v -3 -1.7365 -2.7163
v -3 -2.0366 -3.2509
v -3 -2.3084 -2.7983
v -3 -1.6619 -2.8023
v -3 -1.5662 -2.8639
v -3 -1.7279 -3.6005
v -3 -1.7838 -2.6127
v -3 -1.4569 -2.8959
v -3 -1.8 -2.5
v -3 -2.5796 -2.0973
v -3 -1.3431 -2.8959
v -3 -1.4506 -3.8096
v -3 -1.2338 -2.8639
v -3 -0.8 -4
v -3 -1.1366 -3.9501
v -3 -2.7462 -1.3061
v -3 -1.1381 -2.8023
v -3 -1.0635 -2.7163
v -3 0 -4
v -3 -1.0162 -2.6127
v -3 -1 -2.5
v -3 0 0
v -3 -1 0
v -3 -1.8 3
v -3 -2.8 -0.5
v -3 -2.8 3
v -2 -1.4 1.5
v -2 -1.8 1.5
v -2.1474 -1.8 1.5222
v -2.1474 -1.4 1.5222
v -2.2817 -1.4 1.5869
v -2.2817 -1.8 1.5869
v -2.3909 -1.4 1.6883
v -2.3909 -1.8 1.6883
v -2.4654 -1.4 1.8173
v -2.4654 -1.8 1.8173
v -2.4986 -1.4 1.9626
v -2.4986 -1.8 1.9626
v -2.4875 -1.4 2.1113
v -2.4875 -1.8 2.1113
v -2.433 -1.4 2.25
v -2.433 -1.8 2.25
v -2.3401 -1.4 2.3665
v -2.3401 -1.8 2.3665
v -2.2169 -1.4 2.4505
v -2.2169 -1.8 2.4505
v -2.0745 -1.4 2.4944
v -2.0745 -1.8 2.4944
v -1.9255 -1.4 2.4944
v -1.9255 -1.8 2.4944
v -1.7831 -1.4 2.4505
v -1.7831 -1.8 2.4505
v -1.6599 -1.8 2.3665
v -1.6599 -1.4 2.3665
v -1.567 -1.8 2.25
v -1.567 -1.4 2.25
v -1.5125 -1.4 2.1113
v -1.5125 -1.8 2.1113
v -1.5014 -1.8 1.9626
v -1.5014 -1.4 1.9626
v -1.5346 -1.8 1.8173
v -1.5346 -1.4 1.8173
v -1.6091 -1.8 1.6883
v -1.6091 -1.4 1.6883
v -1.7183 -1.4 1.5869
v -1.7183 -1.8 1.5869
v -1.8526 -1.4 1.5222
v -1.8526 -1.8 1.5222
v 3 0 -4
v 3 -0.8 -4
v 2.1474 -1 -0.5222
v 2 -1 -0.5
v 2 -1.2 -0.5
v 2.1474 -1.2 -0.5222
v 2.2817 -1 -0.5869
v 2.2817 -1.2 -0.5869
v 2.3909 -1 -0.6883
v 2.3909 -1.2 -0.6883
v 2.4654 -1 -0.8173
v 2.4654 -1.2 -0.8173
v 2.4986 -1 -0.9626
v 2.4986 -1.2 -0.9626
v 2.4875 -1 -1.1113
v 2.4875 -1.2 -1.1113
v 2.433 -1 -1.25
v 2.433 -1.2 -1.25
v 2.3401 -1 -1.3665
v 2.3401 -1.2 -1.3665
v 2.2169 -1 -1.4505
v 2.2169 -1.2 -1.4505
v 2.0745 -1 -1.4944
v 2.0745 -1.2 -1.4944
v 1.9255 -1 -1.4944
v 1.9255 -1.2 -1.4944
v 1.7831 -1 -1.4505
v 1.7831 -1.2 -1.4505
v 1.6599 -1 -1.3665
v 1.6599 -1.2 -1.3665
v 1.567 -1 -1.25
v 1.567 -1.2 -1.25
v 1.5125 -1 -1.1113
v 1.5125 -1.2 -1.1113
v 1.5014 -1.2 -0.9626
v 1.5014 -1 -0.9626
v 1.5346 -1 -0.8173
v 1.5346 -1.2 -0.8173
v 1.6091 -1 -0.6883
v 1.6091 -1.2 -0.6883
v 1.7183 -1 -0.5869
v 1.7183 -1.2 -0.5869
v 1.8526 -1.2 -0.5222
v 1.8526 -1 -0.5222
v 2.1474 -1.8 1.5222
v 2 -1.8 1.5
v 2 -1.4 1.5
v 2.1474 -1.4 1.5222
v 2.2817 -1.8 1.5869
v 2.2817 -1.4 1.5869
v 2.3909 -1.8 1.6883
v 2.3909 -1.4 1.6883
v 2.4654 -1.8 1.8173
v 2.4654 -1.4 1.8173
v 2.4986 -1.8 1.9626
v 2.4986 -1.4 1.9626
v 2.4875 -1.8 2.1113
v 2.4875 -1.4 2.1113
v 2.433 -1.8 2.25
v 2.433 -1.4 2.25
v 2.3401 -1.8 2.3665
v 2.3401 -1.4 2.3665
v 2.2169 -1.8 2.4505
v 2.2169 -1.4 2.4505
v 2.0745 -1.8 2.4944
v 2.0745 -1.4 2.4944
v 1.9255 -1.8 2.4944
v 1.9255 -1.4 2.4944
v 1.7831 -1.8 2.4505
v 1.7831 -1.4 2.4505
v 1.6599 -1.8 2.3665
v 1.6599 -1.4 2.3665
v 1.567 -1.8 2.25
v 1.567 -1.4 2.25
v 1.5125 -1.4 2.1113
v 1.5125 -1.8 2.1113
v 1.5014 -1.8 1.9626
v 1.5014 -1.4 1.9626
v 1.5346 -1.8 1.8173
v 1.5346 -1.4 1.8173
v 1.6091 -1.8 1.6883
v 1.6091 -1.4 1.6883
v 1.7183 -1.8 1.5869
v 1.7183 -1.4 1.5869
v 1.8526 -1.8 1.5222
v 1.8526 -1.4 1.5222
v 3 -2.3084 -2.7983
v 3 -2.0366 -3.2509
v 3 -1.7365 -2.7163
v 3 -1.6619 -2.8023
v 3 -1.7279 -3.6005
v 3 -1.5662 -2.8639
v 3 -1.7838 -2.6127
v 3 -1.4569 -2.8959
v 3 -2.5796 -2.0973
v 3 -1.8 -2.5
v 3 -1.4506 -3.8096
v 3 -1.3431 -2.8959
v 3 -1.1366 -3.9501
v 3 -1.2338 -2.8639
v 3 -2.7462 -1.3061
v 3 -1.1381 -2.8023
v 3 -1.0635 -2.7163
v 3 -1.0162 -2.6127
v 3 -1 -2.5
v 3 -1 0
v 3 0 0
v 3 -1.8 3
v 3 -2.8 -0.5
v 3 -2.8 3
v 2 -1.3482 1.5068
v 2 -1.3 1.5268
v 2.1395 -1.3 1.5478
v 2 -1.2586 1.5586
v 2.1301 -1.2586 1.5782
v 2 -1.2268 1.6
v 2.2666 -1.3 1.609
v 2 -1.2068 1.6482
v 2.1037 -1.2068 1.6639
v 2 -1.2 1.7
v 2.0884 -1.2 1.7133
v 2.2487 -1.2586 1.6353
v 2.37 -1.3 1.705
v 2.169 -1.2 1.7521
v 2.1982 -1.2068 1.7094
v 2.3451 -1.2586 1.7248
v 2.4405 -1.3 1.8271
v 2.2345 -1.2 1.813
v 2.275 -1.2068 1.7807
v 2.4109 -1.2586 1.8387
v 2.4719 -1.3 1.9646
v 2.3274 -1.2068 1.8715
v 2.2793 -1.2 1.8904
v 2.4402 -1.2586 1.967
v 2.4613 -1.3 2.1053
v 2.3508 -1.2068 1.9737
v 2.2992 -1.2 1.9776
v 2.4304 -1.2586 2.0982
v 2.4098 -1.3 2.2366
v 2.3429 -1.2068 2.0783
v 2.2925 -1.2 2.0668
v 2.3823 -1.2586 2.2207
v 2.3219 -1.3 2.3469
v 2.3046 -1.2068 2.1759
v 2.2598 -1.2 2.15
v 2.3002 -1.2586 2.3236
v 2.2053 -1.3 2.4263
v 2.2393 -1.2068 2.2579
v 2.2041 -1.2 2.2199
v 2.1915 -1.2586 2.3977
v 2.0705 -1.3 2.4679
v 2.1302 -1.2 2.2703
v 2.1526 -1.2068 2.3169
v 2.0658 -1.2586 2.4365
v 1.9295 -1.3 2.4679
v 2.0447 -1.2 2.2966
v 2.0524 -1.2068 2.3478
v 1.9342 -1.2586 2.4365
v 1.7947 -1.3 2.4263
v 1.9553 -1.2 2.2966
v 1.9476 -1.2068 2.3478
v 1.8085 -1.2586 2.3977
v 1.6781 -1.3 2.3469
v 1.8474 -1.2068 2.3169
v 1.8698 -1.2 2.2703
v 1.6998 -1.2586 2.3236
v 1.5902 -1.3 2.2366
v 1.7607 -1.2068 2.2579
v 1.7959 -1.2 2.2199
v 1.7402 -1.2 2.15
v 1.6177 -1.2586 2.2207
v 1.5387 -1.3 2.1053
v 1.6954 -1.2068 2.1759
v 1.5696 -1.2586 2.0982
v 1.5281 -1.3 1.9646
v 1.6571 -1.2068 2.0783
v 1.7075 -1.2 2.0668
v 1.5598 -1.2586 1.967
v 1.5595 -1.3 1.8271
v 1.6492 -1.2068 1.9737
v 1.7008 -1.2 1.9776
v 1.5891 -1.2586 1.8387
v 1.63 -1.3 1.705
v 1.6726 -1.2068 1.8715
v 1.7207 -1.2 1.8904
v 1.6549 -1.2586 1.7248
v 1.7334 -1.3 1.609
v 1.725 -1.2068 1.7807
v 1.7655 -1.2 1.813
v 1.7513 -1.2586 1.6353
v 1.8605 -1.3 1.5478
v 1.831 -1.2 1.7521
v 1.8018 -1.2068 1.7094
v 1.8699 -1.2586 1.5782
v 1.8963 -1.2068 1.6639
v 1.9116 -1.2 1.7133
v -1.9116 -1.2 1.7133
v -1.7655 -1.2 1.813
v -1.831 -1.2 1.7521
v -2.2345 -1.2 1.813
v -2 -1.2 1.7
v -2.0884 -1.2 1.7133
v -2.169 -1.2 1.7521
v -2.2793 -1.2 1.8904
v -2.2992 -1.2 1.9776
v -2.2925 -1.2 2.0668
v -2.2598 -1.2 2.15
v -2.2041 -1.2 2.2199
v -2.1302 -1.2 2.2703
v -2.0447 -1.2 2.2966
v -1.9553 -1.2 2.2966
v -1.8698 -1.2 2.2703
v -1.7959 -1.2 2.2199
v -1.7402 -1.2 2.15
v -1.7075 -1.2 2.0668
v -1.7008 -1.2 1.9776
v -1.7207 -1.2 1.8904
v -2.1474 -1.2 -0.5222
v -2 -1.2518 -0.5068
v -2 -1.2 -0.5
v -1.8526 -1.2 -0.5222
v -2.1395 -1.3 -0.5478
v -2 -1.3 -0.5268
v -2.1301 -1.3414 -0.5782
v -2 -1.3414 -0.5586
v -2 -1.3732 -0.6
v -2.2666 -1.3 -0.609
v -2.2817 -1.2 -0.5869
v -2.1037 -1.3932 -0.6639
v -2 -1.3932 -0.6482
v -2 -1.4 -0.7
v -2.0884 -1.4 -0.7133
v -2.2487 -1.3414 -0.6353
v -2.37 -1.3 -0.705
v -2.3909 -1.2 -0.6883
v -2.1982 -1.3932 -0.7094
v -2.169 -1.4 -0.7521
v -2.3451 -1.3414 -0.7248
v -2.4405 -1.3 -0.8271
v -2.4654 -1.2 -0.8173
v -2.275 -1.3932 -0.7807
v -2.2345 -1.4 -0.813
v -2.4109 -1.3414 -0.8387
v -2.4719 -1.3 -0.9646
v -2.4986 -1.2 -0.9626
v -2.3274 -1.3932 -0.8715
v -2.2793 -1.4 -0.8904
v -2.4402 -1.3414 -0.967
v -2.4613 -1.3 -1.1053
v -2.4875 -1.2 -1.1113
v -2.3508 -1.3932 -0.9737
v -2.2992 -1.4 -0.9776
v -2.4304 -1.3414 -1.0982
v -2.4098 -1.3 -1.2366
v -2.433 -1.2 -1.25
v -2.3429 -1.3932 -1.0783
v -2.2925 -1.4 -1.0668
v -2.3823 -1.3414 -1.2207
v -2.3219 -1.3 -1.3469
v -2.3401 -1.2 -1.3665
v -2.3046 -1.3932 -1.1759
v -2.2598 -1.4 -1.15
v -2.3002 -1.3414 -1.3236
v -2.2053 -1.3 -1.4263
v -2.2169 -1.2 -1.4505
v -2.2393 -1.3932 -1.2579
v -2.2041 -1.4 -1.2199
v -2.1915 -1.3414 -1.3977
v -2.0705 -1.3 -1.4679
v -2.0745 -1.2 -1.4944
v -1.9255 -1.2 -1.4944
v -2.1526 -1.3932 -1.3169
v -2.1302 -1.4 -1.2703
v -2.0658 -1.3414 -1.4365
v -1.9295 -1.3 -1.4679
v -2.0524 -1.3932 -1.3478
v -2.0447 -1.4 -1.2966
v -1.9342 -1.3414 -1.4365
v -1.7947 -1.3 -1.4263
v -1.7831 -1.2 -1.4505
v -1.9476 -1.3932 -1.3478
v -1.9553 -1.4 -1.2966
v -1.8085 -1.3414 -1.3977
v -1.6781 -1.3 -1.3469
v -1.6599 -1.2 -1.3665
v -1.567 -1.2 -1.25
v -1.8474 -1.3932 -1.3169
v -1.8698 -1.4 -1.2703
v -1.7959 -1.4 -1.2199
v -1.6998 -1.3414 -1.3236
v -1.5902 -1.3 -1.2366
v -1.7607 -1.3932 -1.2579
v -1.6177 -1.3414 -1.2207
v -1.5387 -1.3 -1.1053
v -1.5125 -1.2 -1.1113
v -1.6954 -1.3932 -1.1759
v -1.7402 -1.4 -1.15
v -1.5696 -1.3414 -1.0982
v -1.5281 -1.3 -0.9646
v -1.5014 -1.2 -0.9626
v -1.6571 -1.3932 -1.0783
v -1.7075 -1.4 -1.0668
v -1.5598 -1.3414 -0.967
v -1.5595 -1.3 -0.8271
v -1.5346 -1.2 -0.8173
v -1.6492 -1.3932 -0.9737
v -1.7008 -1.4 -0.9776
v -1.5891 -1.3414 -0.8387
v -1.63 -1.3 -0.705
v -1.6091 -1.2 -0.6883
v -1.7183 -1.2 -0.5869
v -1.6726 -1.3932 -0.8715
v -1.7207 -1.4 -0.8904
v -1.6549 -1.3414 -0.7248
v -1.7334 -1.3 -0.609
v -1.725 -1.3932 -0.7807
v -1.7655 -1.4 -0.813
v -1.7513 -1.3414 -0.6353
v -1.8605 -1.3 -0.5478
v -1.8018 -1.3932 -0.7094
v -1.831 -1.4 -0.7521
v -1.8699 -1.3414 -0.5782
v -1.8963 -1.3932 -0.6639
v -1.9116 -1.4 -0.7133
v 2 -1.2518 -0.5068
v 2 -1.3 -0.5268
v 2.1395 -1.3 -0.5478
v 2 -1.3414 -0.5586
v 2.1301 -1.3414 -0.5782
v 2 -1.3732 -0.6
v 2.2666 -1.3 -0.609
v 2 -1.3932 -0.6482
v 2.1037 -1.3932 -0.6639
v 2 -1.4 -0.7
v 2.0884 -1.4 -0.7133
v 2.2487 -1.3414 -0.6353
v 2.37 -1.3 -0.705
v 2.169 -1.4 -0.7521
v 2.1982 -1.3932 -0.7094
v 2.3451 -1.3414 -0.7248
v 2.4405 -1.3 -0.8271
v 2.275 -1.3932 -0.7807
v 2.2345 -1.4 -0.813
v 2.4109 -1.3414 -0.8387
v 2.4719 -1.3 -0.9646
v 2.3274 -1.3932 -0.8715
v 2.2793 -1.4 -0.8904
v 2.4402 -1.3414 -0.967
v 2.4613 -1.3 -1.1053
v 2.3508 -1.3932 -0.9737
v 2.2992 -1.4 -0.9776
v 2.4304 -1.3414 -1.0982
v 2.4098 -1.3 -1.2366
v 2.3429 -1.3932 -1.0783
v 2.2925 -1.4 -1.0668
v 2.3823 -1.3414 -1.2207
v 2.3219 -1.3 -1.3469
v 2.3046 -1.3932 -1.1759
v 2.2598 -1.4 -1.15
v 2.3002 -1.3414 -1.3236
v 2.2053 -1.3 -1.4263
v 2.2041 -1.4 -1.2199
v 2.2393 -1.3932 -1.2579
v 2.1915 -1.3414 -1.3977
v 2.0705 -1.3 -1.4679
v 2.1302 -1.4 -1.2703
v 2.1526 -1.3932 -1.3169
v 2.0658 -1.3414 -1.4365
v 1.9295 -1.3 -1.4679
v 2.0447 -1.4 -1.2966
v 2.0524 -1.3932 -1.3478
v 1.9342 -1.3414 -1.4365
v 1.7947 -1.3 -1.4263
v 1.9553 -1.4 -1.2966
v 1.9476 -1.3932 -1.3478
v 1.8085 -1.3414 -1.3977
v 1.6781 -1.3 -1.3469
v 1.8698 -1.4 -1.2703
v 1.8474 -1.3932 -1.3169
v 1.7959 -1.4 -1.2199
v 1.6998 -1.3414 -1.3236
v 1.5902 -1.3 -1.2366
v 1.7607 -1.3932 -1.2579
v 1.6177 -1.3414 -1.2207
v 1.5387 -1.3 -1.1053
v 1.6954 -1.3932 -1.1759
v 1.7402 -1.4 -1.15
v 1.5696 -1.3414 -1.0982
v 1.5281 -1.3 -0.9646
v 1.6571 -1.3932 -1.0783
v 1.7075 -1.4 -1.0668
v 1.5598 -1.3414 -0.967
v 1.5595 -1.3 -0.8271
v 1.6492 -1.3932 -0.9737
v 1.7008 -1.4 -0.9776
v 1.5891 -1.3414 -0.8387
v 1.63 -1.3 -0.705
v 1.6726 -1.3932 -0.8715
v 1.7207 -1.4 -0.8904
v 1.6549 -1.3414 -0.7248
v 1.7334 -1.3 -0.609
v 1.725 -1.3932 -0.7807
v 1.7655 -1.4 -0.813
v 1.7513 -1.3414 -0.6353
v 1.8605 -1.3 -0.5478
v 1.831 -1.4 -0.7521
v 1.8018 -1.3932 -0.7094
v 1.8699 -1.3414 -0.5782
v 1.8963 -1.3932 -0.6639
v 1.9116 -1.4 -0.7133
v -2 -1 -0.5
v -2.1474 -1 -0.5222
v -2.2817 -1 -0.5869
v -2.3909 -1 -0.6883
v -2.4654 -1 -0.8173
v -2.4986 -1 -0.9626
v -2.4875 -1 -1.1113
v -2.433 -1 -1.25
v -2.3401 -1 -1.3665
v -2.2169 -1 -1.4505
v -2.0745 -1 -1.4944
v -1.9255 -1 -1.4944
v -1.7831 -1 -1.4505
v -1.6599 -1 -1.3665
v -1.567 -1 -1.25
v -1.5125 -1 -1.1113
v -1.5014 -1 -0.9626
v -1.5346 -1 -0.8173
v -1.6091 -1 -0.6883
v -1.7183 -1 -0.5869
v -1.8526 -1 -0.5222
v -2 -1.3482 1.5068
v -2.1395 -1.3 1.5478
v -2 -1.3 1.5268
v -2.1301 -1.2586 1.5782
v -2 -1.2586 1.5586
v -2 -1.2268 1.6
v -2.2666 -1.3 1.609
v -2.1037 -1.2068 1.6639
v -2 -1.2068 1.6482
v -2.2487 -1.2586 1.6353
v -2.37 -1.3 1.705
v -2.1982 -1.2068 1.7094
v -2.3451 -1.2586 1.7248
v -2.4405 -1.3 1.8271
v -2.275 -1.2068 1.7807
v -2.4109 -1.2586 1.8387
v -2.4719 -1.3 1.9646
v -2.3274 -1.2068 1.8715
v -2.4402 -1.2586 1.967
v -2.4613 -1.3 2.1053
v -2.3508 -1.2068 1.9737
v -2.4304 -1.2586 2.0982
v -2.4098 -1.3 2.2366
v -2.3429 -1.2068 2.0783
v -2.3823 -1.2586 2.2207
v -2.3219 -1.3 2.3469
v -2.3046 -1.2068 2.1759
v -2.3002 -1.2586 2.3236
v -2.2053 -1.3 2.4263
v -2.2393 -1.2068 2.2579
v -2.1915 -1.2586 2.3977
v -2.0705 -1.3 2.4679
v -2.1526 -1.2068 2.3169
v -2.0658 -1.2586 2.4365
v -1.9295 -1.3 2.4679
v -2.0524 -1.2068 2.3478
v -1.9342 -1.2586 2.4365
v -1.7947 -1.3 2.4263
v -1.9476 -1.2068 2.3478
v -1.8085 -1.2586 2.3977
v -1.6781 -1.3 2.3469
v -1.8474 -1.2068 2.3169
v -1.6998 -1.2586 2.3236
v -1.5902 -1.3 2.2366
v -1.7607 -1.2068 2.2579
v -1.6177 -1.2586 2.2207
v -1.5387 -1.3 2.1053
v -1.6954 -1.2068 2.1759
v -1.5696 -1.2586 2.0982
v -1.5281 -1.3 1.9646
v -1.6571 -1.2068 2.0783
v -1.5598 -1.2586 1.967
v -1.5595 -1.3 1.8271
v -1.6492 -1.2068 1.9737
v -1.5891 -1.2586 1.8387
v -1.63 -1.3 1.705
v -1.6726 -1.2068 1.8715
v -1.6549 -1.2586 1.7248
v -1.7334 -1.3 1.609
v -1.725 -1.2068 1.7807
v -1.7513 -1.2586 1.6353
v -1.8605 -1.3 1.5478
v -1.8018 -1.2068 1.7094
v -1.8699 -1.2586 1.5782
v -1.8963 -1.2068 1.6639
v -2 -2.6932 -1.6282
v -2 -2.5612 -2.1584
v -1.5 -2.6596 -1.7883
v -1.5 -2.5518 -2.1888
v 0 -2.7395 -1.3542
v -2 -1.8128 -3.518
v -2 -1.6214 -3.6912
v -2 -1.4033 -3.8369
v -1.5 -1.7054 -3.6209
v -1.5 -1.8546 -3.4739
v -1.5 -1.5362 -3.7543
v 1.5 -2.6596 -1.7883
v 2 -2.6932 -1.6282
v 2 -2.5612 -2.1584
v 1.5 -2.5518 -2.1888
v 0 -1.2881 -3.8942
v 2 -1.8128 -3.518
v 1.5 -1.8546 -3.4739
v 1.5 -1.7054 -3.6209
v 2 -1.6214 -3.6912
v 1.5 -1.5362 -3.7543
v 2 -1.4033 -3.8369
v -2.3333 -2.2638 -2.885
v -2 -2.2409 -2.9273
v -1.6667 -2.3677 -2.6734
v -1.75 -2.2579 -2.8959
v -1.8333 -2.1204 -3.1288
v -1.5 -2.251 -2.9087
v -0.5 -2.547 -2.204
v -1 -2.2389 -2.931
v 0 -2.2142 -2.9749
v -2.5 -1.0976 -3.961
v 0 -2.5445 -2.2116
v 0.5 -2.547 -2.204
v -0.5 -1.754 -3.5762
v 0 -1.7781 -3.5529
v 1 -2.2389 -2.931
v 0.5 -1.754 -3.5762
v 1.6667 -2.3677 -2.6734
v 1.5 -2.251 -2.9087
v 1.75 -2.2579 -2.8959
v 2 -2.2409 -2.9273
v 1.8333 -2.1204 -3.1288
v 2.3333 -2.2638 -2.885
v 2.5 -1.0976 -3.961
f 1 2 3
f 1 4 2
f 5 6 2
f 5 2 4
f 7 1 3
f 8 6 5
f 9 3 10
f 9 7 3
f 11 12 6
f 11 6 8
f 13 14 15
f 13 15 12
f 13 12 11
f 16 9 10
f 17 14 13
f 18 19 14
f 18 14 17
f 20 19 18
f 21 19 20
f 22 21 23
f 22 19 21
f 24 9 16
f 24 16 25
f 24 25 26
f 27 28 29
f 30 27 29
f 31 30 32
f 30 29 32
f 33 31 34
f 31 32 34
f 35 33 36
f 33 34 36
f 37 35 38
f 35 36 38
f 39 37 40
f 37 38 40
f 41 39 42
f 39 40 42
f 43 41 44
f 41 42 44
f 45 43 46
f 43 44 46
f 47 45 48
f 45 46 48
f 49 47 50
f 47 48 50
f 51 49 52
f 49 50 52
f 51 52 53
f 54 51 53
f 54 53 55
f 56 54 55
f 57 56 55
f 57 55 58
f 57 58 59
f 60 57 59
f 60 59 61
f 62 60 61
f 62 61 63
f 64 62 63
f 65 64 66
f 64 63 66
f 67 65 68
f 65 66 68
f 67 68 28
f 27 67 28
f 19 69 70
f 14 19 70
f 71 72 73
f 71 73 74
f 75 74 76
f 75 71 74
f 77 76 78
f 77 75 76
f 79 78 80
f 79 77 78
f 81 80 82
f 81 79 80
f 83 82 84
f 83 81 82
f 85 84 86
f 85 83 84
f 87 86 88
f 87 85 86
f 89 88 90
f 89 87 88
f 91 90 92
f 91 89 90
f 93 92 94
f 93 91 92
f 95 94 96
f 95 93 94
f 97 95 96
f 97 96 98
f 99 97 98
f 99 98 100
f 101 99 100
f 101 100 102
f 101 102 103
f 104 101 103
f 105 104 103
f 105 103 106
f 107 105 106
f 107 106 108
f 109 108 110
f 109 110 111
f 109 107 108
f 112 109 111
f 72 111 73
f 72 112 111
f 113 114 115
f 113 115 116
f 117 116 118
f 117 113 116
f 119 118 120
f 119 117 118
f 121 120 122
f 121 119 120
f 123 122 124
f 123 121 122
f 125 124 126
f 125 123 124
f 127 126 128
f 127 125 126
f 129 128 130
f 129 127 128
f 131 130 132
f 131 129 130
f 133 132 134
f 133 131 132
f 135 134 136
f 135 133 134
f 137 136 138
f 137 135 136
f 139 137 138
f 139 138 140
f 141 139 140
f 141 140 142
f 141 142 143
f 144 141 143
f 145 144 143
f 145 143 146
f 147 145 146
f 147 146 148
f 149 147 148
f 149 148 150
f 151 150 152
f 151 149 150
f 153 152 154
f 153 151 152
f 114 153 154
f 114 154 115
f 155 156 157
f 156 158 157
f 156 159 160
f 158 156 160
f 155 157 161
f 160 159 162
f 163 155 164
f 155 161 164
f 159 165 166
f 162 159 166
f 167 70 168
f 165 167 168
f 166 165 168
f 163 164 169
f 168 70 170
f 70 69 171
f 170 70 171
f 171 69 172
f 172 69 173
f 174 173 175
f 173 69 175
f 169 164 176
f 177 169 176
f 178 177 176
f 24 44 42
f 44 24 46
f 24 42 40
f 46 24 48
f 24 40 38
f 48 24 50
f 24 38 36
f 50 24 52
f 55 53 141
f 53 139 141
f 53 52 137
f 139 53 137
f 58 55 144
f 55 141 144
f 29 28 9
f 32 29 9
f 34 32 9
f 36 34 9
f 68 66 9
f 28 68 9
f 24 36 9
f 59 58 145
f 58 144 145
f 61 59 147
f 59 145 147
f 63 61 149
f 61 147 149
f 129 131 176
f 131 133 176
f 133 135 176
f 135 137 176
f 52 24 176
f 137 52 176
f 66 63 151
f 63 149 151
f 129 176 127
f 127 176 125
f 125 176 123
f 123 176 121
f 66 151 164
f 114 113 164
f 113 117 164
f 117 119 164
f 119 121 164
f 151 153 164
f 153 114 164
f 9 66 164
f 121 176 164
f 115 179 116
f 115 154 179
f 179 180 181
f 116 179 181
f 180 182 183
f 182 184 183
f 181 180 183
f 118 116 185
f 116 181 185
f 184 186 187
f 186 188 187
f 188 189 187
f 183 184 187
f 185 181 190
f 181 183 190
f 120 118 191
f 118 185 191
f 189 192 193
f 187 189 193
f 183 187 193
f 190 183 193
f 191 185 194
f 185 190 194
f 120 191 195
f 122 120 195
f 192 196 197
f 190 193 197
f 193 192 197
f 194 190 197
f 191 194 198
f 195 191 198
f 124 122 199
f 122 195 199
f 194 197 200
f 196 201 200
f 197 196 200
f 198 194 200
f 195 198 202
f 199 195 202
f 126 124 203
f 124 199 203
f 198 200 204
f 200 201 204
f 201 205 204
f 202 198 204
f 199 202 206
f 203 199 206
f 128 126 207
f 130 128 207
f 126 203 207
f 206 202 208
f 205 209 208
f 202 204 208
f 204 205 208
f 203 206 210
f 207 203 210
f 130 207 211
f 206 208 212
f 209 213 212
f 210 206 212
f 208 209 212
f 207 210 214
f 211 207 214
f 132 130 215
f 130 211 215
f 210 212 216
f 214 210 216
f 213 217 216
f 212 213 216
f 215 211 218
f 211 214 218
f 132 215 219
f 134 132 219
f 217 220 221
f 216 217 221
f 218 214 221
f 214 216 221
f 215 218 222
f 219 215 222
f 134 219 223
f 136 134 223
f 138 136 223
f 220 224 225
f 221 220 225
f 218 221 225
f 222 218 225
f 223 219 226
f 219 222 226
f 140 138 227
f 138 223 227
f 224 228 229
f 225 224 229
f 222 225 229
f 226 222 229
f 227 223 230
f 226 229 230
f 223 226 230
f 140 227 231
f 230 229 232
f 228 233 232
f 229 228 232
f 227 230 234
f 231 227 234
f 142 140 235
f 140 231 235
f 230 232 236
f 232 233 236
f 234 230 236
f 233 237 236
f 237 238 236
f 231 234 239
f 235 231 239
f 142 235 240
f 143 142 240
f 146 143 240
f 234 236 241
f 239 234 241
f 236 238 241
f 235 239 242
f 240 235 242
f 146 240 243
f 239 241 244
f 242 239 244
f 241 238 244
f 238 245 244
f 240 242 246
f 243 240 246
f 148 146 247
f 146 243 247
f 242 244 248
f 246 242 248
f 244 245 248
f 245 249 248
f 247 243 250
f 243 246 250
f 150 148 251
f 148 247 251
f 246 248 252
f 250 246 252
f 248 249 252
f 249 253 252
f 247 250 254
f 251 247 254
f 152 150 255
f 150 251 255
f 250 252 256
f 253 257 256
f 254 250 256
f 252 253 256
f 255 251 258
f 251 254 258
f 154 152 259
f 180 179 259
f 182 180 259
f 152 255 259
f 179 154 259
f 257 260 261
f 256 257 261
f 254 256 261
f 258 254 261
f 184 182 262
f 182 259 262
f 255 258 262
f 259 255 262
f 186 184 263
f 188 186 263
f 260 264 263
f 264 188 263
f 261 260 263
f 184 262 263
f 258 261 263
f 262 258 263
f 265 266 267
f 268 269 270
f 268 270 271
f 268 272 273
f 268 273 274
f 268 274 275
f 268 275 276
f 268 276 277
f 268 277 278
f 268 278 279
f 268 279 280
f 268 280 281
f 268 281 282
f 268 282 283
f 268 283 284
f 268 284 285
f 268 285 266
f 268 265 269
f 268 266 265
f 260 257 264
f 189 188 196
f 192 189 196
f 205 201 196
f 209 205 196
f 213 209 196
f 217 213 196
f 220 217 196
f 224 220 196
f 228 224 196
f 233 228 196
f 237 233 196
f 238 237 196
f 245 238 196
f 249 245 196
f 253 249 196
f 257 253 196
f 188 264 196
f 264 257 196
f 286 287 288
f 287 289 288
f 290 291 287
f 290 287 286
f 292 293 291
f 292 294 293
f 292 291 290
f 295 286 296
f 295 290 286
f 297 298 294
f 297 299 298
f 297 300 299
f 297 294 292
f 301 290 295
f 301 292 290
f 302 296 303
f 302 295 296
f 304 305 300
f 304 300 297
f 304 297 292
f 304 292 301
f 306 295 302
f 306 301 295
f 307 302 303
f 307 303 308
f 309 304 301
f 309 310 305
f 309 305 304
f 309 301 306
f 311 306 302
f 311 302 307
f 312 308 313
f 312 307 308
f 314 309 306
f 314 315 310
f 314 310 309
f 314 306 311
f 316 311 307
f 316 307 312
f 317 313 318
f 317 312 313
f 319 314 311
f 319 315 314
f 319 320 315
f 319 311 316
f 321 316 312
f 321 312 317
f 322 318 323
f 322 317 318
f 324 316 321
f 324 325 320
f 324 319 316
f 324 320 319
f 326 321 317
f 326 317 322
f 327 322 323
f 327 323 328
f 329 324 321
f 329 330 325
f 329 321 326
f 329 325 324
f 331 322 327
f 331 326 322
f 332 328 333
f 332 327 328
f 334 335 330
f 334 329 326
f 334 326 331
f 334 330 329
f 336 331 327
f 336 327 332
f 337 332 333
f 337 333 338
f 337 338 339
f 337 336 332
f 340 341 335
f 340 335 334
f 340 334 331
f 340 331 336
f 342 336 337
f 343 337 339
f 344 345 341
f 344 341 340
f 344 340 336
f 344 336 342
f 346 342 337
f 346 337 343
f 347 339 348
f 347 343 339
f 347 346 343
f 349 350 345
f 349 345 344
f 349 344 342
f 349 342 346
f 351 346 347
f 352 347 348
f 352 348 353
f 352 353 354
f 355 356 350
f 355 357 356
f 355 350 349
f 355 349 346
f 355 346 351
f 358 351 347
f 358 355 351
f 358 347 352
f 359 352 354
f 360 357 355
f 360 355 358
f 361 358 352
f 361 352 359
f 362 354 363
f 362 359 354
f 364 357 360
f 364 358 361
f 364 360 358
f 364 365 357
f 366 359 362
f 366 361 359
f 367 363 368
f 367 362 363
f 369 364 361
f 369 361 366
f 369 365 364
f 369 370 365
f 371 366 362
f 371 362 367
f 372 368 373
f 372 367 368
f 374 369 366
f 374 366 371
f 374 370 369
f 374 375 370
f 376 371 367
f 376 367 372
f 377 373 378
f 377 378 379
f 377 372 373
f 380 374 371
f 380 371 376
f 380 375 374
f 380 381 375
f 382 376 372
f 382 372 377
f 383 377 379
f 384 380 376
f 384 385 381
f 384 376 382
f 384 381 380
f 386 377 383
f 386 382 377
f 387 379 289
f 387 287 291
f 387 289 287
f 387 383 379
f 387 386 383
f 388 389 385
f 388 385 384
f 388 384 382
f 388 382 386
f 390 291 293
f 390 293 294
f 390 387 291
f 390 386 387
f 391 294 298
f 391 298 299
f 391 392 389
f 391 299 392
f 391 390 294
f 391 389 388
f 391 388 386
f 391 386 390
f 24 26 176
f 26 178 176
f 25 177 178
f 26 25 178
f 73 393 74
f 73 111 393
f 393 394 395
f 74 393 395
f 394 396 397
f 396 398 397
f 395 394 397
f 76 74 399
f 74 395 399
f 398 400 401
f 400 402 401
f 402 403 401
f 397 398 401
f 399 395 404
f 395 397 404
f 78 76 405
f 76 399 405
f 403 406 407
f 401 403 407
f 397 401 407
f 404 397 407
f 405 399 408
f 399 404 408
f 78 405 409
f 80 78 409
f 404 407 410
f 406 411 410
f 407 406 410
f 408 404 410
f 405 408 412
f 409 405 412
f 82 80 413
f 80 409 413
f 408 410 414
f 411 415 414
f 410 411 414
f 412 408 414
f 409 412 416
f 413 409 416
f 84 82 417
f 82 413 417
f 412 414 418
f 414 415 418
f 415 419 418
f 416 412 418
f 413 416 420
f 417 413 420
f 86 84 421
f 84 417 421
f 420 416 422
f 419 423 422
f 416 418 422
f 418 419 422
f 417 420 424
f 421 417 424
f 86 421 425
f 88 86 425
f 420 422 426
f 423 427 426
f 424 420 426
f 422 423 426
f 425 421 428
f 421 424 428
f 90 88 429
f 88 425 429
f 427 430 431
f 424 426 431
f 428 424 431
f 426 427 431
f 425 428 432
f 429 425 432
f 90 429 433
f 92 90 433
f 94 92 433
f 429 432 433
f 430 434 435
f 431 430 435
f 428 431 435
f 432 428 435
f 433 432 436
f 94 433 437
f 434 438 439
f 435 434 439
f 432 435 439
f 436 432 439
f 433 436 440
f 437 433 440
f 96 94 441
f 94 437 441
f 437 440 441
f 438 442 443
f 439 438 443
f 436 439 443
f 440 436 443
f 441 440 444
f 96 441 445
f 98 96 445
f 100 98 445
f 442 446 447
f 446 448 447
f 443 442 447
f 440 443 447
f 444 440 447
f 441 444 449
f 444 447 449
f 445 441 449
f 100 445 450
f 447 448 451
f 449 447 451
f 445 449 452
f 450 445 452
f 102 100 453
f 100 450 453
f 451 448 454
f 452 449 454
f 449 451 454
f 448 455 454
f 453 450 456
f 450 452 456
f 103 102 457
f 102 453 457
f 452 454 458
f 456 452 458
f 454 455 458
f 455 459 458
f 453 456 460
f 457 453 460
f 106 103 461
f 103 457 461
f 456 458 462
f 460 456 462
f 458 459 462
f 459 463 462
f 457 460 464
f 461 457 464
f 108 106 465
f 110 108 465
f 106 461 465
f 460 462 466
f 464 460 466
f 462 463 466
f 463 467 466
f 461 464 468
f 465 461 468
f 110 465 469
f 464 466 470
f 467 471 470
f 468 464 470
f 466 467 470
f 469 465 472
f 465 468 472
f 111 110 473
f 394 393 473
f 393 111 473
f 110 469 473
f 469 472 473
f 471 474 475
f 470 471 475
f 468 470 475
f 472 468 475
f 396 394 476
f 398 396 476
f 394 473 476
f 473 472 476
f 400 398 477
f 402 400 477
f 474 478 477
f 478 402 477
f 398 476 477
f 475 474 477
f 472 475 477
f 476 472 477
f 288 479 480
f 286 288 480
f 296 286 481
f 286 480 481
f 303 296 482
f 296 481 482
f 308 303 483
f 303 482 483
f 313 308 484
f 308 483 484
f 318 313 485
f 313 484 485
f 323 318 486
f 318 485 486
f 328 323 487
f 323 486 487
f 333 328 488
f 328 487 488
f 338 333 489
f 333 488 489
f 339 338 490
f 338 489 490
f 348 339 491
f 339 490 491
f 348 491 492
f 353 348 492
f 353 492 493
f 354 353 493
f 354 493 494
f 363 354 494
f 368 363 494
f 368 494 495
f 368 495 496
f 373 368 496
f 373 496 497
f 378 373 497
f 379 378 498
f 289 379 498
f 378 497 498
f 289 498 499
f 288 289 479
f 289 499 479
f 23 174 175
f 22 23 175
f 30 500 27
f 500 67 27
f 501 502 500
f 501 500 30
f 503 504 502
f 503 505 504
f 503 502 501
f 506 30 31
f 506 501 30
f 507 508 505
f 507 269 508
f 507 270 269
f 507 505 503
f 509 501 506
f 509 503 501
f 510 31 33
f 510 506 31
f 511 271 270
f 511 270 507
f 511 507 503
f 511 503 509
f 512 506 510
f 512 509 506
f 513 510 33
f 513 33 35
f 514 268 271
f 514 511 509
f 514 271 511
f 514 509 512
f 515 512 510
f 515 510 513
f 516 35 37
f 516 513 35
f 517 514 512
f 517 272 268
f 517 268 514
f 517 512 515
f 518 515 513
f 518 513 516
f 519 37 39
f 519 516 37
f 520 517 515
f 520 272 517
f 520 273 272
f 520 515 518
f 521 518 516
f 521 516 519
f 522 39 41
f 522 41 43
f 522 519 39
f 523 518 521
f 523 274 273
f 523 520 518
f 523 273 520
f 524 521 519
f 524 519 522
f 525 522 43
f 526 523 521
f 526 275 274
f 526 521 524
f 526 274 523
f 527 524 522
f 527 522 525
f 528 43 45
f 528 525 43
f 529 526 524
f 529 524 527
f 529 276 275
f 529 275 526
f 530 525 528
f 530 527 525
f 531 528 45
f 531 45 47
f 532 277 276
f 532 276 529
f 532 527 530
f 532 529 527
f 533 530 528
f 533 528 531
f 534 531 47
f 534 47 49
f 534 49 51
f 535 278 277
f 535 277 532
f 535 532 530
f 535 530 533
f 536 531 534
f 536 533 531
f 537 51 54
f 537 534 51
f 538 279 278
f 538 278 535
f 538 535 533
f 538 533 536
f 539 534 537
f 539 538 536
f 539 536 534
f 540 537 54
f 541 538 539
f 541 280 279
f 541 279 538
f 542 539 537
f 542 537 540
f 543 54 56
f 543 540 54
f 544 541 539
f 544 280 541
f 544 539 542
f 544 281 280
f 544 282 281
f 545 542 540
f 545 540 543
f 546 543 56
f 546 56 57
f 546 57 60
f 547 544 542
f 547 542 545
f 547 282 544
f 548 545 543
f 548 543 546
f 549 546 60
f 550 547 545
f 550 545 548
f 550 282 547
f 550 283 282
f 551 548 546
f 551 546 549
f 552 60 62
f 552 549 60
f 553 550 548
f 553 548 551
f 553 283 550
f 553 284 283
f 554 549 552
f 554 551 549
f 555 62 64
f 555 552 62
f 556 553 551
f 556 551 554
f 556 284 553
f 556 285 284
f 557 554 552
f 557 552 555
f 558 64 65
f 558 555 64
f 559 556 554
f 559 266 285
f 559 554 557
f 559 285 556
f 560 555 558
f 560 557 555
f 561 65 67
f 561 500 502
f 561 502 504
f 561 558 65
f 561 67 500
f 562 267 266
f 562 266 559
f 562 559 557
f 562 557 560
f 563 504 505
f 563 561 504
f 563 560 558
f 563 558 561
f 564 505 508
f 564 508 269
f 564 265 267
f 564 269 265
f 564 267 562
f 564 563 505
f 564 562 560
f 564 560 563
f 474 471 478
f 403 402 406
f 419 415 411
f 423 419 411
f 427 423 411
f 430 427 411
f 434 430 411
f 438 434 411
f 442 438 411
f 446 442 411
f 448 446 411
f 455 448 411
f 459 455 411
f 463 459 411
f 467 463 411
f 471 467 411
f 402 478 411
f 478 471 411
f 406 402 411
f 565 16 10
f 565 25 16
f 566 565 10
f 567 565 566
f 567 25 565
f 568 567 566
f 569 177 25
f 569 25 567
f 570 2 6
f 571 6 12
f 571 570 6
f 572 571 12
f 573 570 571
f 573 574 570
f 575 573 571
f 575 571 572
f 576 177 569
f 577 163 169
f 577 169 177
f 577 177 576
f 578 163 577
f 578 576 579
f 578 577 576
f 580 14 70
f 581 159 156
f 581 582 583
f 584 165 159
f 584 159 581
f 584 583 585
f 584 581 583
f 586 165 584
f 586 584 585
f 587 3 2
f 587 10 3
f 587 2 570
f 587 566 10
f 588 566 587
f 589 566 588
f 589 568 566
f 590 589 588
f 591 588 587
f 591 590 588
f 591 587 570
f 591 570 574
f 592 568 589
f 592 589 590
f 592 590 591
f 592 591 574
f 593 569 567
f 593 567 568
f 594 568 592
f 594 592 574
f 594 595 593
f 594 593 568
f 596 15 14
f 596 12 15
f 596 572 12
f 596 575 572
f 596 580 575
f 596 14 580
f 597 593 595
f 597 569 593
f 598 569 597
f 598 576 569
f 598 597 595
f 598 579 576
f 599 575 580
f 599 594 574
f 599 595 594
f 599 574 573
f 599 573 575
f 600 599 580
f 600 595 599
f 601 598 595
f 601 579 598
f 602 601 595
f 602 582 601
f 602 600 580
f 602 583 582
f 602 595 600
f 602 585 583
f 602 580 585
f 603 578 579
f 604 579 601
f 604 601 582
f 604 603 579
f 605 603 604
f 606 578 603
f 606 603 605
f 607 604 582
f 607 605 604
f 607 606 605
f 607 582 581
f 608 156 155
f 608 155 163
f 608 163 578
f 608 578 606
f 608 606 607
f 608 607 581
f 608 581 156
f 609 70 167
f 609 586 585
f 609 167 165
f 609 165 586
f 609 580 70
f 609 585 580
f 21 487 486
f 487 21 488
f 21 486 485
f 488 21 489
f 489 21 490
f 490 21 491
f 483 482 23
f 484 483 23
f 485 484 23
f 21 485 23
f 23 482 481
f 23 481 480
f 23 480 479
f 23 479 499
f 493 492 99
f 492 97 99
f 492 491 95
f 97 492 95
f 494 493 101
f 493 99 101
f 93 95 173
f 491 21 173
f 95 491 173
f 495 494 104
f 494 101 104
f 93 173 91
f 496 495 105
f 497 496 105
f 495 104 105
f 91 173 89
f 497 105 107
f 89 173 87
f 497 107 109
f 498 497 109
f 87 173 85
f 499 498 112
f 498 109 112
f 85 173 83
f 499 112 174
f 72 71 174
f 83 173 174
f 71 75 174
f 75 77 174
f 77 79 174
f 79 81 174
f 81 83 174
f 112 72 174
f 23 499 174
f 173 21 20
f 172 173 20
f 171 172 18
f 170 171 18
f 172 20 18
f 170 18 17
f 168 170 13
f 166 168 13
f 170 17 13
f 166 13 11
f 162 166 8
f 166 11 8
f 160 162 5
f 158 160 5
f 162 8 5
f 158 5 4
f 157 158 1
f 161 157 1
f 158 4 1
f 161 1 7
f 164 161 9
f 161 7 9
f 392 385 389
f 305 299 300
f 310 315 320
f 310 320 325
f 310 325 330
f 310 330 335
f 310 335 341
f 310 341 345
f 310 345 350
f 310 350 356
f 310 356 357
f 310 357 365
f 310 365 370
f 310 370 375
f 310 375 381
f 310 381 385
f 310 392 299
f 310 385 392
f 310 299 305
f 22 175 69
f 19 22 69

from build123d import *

# Parameters (mm, degrees)
RESSALTO_EXTRUS_O1_DEPTH = 3
FILETE1_SIZE             = 3.5
FILETE1_SIZE_2           = 2
ESBO_O2_R                = 0.5
RESSALTO_EXTRUS_O4_DEPTH = 0.6
ESBO_O3_R                = 0.5
RESSALTO_EXTRUS_O5_DEPTH = 0.4
FILETE2_R                = 0.2
FILETE2_OF_ESPELHAR1_R   = 0.2
ESBO_O4_R                = 0.4
CORTE_EXTRUS_O1_DEPTH    = 8.735632008


with BuildPart() as part:
    # Esboço1 → Ressalto-extrusão1 (new, symmetric)
    with BuildSketch(Plane(origin=(0, 0, 0), x_dir=(0, 0, -1), z_dir=(1, 0, 0))):
        Polygon((0, 0), (4, 0), (4, -2.8), (-3, -2.8), (-3, -1.8), (2.5, -1.8), (2.5, -1), (0, -1), align=None)
    extrude(amount=RESSALTO_EXTRUS_O1_DEPTH, both=True)

    # Filete1
    # an asymmetric fillet: 3.5, 2 mm, written as the material it takes off along each edge
    with BuildSketch(Plane(origin=(11.75, -2.8, -4), x_dir=(0, 0, 1), z_dir=(-1, 0, 0))) as filete1_piece_1:
        with BuildLine():
            Bezier((FILETE1_SIZE, 0), (0, 0), (0, FILETE1_SIZE_2), weights=[1, 0.707106781, 1])
            Line((0, FILETE1_SIZE_2), (0, 0))
            Line((0, 0), (FILETE1_SIZE, 0))
        make_face()
    extrude(amount=23.5, mode=Mode.SUBTRACT)

    # Esboço2 → Ressalto-extrusão4 (add)
    with BuildSketch(Plane(origin=(0, -1.8, 0), x_dir=(1, 0, 0), z_dir=(0, 1, 0))):
        with Locations(Location((-2, -2, 0), (0, 0, 90))):
            Circle(ESBO_O2_R)
    ressalto_extrus_o4 = extrude(amount=RESSALTO_EXTRUS_O4_DEPTH)

    # Esboço3 → Ressalto-extrusão5 (add)
    with BuildSketch(Plane.XZ.offset(1)):
        with Locations(Location((-2, -1, 0), (0, 0, 90))):
            Circle(ESBO_O3_R)
    ressalto_extrus_o5 = extrude(amount=RESSALTO_EXTRUS_O5_DEPTH)

    # Filete2
    filete2_edges = [part.edges().sort_by_distance(p)[0] for p in [
        (-2, -1.2, 2.5),
        (-2, -1.4, -1.5),
    ]]
    fillet(filete2_edges, radius=FILETE2_R)

    # Espelhar1: Ressalto-extrusão4, Ressalto-extrusão5 across plane
    add(ressalto_extrus_o4.mirror(Plane(origin=(0, 0, 0), x_dir=(0, 0, 1), z_dir=(1, 0, 0))))
    add(ressalto_extrus_o5.mirror(Plane(origin=(0, 0, 0), x_dir=(0, 0, 1), z_dir=(1, 0, 0))))

    # Filete2 of Espelhar1
    filete2_of_espelhar1_edges = [part.edges().sort_by_distance(p)[0] for p in [
        (2, -1.2, 2.5),
        (2, -1.4, -1.5),
    ]]
    fillet(filete2_of_espelhar1_edges, radius=FILETE2_OF_ESPELHAR1_R)

    # Esboço4 → Corte-extrusão1 (cut, through all)
    with BuildSketch(Plane.ZY.offset(3)):
        with Locations((-2.5, -1.4)):
            Circle(ESBO_O4_R)
    extrude(amount=-CORTE_EXTRUS_O1_DEPTH, mode=Mode.SUBTRACT)


solid = part.part
